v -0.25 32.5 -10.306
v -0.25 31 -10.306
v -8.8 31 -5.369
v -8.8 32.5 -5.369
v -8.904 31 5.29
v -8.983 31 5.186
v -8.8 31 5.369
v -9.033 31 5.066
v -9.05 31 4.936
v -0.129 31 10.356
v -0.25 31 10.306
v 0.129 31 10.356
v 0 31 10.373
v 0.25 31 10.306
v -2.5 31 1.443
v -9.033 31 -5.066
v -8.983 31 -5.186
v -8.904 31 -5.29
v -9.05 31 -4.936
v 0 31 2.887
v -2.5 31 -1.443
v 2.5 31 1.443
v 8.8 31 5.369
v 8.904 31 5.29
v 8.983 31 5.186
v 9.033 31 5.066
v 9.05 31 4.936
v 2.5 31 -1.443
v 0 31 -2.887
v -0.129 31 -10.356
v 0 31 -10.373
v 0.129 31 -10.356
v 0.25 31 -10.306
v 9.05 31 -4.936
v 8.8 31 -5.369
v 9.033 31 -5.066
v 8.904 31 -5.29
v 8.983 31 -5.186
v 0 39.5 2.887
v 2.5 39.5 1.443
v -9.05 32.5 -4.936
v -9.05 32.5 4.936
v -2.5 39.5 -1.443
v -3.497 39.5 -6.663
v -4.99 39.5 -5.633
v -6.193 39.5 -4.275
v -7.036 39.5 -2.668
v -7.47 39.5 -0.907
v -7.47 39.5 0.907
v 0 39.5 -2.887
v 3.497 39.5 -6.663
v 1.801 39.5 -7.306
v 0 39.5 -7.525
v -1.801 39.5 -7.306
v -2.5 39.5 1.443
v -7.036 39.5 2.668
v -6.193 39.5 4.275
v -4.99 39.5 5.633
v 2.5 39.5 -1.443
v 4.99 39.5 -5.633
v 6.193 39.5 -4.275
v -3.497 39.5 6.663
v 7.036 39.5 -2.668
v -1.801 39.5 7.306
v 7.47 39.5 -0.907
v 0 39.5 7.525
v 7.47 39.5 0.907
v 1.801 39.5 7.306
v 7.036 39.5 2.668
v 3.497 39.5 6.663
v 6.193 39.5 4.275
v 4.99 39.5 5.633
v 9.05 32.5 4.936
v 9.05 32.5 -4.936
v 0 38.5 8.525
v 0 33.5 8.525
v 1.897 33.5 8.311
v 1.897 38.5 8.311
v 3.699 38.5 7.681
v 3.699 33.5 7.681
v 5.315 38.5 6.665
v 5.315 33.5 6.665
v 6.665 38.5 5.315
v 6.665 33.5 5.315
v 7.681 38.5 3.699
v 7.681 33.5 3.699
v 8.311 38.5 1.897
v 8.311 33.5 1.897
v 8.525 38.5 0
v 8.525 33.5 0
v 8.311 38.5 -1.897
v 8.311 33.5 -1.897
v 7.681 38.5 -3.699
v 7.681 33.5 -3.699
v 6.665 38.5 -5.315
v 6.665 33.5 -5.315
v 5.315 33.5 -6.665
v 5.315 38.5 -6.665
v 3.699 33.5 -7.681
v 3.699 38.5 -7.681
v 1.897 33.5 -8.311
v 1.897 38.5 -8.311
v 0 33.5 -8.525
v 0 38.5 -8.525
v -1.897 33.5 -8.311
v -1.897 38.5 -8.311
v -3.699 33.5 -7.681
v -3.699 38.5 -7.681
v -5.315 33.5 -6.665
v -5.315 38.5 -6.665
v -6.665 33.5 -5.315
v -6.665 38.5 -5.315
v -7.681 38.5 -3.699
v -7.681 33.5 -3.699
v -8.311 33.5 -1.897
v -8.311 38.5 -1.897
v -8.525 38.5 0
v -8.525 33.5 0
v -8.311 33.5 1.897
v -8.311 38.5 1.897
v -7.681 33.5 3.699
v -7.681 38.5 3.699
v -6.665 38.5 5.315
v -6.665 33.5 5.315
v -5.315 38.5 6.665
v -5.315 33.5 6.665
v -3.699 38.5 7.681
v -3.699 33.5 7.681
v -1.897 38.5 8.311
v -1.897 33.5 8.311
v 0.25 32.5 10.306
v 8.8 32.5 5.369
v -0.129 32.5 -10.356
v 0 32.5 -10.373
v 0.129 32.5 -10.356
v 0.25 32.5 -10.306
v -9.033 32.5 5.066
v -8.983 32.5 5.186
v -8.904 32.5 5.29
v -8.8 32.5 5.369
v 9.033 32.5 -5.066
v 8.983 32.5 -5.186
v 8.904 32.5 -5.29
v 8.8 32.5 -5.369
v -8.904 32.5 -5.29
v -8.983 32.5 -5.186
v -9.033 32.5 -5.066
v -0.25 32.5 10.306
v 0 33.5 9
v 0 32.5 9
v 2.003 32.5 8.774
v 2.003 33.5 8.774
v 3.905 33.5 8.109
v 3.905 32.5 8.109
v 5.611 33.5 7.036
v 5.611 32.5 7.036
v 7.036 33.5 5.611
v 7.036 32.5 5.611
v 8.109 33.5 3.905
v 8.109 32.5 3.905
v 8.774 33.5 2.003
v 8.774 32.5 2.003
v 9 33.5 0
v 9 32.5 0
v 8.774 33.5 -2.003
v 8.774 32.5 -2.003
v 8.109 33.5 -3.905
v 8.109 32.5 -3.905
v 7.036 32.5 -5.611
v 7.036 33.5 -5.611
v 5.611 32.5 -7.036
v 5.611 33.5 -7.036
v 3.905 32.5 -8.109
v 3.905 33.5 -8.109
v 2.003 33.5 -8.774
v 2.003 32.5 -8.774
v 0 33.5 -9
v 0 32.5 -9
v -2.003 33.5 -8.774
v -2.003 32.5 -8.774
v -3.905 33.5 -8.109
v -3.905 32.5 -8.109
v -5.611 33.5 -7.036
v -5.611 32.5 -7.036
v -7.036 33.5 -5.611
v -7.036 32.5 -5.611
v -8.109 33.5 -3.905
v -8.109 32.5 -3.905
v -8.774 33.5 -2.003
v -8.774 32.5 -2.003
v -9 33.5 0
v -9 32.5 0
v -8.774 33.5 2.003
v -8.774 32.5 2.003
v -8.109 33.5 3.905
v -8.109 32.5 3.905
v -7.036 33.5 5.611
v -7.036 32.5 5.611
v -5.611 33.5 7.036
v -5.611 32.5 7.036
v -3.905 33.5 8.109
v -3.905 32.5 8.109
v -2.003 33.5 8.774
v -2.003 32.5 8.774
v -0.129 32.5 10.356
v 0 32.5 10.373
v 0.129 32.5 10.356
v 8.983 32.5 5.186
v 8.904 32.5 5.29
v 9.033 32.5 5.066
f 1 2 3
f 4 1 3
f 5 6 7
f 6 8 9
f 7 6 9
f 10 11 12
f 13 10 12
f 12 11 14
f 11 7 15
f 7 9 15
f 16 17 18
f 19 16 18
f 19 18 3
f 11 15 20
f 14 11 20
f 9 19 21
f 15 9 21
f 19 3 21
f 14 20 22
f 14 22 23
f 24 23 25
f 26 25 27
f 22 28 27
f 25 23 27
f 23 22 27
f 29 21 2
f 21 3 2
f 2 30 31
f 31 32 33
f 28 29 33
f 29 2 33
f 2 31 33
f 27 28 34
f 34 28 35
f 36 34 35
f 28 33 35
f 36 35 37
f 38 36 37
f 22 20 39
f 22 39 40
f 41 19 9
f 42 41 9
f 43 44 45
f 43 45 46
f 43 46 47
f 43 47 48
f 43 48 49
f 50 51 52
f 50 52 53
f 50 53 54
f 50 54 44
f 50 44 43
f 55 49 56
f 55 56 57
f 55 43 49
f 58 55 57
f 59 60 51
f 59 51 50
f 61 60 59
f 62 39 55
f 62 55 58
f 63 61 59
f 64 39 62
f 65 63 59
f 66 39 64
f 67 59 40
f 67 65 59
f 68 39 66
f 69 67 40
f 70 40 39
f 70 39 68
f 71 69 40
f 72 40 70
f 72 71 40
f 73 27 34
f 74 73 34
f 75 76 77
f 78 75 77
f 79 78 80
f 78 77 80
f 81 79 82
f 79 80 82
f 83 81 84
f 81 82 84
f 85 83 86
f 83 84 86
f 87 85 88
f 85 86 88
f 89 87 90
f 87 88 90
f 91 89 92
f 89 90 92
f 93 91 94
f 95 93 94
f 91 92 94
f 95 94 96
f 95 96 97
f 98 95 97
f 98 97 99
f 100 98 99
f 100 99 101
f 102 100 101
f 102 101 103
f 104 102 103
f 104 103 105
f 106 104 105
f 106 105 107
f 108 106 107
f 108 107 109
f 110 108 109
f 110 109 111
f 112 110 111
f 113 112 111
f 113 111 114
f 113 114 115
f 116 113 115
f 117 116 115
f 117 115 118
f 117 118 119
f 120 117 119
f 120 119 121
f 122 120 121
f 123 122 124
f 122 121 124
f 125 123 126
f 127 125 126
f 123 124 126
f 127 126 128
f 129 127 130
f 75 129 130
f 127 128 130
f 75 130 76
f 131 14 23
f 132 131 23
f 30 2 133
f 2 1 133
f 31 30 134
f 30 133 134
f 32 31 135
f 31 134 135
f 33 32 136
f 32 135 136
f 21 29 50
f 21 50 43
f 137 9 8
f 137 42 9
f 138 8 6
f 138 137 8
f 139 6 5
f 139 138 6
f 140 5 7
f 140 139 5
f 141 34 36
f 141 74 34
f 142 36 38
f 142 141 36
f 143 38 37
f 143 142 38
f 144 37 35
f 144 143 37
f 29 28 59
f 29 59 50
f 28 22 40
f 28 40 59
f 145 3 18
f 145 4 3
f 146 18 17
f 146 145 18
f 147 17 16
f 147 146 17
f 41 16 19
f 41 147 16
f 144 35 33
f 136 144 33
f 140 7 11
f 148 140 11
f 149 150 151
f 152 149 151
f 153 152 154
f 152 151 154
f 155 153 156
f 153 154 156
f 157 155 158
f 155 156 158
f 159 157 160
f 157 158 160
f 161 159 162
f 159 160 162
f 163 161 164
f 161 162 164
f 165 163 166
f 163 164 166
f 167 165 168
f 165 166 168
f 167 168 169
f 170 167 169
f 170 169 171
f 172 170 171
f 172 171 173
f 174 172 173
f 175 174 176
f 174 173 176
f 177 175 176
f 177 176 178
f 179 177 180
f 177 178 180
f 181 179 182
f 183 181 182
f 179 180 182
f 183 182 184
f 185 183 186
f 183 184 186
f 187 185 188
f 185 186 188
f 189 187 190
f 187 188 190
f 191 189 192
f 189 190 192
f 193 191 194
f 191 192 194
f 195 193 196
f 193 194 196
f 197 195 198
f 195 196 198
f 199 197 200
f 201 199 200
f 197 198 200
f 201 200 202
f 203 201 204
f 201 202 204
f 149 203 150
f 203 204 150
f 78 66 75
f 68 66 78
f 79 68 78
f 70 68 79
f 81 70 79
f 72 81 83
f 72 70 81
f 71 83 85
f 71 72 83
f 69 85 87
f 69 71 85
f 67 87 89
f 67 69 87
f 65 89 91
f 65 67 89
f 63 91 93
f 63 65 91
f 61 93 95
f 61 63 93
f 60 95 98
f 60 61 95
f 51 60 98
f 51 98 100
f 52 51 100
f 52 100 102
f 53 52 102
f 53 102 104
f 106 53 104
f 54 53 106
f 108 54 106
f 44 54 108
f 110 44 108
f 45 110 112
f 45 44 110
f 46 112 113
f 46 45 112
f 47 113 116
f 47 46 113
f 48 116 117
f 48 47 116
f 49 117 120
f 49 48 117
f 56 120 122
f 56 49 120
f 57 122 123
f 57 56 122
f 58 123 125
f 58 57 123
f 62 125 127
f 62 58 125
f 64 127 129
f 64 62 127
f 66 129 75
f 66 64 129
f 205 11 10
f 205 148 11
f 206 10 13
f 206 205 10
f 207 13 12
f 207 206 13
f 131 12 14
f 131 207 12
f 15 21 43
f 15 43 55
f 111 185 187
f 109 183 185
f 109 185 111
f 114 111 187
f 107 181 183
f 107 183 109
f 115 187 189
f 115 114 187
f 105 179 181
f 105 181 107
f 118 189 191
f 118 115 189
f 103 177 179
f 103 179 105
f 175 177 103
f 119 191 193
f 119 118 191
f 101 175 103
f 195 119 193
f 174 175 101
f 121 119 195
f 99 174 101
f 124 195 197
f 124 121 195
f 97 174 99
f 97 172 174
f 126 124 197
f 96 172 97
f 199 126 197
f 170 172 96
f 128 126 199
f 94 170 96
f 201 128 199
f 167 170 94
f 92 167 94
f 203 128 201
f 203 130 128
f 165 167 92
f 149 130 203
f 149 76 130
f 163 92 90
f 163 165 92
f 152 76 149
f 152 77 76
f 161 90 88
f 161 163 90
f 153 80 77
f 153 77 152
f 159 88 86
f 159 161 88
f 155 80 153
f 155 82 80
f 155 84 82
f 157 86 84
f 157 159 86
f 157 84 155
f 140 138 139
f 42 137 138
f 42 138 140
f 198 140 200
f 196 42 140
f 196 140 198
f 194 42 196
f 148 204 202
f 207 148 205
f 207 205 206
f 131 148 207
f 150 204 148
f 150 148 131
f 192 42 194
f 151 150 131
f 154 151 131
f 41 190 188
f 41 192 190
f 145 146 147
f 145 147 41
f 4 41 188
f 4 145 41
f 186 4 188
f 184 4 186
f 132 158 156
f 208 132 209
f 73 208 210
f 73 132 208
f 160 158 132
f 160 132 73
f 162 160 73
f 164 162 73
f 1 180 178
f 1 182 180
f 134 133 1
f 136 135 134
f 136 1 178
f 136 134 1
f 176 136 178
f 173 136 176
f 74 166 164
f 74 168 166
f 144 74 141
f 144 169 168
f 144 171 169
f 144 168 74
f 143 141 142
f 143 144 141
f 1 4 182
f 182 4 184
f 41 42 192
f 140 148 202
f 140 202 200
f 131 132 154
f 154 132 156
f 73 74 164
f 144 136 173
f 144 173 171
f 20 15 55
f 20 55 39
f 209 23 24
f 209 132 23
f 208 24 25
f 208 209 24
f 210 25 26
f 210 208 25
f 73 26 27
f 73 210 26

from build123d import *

# Parameters (mm, degrees)
BOSS_EXTRUDE1_DEPTH      = 1.5
FILLET1_R                = 0.5
SKETCH2_R                = 9
BOSS_EXTRUDE2_DEPTH      = 1
SKETCH3_R                = 8.525
BOSS_EXTRUDE3_DEPTH      = 4
BOSS_EXTRUDE4_DEPTH      = 1
BOSS_EXTRUDE4_DEPTH_BACK = 1
SKETCH5_R                = 8.525
SKETCH6_R                = 8.525
BOSS_EXTRUDE5_DEPTH      = 1
CHAMFER2_SIZE            = 1
CUT_EXTRUDE1_DEPTH       = 17.178541022


with BuildPart() as part:
    # Sketch1 → Boss-Extrude1 (new body)
    with BuildSketch(Plane(origin=(0, 31, 0), x_dir=(1, 0, 0), z_dir=(0, 1, 0))):
        Polygon((0, 10.450039872), (-9.05, 5.225019936), (-9.05, -5.225019936), (0, -10.450039872), (9.05, -5.225019936), (9.05, 5.225019936), align=None)
    extrude(amount=BOSS_EXTRUDE1_DEPTH)

    # Fillet1
    fillet1_edges = [part.edges().sort_by_distance(p)[0] for p in [
        (9.05, 31.75, -5.225019936),
        (9.05, 31.75, 5.225019936),
        (0, 31.75, 10.450039872),
        (-9.05, 31.75, 5.225019936),
        (-9.05, 31.75, -5.225019936),
        (0, 31.75, -10.450039872),
    ]]
    fillet(fillet1_edges, radius=FILLET1_R)

    # Sketch2 → Boss-Extrude2 (add)
    with BuildSketch(Plane(origin=(0, 32.5, 0), x_dir=(1, 0, 0), z_dir=(0, 1, 0))):
        with Locations(Location((0, 0, 0), (0, 0, 270))):
            Circle(SKETCH2_R)
    extrude(amount=BOSS_EXTRUDE2_DEPTH)

    # Sketch3 → Boss-Extrude3 (add)
    with BuildSketch(Plane(origin=(0, 33.5, 0), x_dir=(1, 0, 0), z_dir=(0, 1, 0))):
        with Locations(Location((0, 0, 0), (0, 0, 270))):
            Circle(SKETCH3_R)
    extrude(amount=BOSS_EXTRUDE3_DEPTH)

    # Sketch5 → Boss-Extrude4 (add, two sides: drawn at the far end of the back side and taken through both)
    with BuildSketch(Plane(origin=(0, 37.5, 0), x_dir=(1, 0, 0), z_dir=(0, 1, 0)).offset(-BOSS_EXTRUDE4_DEPTH_BACK)):
        with Locations(Location((0, 0, 0), (0, 0, 270))):
            Circle(SKETCH5_R)
    extrude(amount=BOSS_EXTRUDE4_DEPTH + BOSS_EXTRUDE4_DEPTH_BACK)

    # Sketch6 → Boss-Extrude5 (add)
    with BuildSketch(Plane(origin=(0, 38.5, 0), x_dir=(1, 0, 0), z_dir=(0, 1, 0))):
        with Locations(Location((0, 0, 0), (0, 0, 270))):
            Circle(SKETCH6_R)
    extrude(amount=BOSS_EXTRUDE5_DEPTH)

    # Chamfer2
    chamfer2_edges = [part.edges().sort_by_distance(p)[0] for p in [
        (0, 39.5, -8.525),
    ]]
    chamfer(chamfer2_edges, length=CHAMFER2_SIZE)

    # Sketch4 → Cut-Extrude1 (cut, through all)
    with BuildSketch(Plane(origin=(0, 31, 0), x_dir=(1, 0, 0), z_dir=(0, 1, 0))):
        Polygon((0, 2.886751346), (-2.5, 1.443375673), (-2.5, -1.443375673), (0, -2.886751346), (2.5, -1.443375673), (2.5, 1.443375673), align=None)
    extrude(amount=CUT_EXTRUDE1_DEPTH, mode=Mode.SUBTRACT)


solid = part.part
